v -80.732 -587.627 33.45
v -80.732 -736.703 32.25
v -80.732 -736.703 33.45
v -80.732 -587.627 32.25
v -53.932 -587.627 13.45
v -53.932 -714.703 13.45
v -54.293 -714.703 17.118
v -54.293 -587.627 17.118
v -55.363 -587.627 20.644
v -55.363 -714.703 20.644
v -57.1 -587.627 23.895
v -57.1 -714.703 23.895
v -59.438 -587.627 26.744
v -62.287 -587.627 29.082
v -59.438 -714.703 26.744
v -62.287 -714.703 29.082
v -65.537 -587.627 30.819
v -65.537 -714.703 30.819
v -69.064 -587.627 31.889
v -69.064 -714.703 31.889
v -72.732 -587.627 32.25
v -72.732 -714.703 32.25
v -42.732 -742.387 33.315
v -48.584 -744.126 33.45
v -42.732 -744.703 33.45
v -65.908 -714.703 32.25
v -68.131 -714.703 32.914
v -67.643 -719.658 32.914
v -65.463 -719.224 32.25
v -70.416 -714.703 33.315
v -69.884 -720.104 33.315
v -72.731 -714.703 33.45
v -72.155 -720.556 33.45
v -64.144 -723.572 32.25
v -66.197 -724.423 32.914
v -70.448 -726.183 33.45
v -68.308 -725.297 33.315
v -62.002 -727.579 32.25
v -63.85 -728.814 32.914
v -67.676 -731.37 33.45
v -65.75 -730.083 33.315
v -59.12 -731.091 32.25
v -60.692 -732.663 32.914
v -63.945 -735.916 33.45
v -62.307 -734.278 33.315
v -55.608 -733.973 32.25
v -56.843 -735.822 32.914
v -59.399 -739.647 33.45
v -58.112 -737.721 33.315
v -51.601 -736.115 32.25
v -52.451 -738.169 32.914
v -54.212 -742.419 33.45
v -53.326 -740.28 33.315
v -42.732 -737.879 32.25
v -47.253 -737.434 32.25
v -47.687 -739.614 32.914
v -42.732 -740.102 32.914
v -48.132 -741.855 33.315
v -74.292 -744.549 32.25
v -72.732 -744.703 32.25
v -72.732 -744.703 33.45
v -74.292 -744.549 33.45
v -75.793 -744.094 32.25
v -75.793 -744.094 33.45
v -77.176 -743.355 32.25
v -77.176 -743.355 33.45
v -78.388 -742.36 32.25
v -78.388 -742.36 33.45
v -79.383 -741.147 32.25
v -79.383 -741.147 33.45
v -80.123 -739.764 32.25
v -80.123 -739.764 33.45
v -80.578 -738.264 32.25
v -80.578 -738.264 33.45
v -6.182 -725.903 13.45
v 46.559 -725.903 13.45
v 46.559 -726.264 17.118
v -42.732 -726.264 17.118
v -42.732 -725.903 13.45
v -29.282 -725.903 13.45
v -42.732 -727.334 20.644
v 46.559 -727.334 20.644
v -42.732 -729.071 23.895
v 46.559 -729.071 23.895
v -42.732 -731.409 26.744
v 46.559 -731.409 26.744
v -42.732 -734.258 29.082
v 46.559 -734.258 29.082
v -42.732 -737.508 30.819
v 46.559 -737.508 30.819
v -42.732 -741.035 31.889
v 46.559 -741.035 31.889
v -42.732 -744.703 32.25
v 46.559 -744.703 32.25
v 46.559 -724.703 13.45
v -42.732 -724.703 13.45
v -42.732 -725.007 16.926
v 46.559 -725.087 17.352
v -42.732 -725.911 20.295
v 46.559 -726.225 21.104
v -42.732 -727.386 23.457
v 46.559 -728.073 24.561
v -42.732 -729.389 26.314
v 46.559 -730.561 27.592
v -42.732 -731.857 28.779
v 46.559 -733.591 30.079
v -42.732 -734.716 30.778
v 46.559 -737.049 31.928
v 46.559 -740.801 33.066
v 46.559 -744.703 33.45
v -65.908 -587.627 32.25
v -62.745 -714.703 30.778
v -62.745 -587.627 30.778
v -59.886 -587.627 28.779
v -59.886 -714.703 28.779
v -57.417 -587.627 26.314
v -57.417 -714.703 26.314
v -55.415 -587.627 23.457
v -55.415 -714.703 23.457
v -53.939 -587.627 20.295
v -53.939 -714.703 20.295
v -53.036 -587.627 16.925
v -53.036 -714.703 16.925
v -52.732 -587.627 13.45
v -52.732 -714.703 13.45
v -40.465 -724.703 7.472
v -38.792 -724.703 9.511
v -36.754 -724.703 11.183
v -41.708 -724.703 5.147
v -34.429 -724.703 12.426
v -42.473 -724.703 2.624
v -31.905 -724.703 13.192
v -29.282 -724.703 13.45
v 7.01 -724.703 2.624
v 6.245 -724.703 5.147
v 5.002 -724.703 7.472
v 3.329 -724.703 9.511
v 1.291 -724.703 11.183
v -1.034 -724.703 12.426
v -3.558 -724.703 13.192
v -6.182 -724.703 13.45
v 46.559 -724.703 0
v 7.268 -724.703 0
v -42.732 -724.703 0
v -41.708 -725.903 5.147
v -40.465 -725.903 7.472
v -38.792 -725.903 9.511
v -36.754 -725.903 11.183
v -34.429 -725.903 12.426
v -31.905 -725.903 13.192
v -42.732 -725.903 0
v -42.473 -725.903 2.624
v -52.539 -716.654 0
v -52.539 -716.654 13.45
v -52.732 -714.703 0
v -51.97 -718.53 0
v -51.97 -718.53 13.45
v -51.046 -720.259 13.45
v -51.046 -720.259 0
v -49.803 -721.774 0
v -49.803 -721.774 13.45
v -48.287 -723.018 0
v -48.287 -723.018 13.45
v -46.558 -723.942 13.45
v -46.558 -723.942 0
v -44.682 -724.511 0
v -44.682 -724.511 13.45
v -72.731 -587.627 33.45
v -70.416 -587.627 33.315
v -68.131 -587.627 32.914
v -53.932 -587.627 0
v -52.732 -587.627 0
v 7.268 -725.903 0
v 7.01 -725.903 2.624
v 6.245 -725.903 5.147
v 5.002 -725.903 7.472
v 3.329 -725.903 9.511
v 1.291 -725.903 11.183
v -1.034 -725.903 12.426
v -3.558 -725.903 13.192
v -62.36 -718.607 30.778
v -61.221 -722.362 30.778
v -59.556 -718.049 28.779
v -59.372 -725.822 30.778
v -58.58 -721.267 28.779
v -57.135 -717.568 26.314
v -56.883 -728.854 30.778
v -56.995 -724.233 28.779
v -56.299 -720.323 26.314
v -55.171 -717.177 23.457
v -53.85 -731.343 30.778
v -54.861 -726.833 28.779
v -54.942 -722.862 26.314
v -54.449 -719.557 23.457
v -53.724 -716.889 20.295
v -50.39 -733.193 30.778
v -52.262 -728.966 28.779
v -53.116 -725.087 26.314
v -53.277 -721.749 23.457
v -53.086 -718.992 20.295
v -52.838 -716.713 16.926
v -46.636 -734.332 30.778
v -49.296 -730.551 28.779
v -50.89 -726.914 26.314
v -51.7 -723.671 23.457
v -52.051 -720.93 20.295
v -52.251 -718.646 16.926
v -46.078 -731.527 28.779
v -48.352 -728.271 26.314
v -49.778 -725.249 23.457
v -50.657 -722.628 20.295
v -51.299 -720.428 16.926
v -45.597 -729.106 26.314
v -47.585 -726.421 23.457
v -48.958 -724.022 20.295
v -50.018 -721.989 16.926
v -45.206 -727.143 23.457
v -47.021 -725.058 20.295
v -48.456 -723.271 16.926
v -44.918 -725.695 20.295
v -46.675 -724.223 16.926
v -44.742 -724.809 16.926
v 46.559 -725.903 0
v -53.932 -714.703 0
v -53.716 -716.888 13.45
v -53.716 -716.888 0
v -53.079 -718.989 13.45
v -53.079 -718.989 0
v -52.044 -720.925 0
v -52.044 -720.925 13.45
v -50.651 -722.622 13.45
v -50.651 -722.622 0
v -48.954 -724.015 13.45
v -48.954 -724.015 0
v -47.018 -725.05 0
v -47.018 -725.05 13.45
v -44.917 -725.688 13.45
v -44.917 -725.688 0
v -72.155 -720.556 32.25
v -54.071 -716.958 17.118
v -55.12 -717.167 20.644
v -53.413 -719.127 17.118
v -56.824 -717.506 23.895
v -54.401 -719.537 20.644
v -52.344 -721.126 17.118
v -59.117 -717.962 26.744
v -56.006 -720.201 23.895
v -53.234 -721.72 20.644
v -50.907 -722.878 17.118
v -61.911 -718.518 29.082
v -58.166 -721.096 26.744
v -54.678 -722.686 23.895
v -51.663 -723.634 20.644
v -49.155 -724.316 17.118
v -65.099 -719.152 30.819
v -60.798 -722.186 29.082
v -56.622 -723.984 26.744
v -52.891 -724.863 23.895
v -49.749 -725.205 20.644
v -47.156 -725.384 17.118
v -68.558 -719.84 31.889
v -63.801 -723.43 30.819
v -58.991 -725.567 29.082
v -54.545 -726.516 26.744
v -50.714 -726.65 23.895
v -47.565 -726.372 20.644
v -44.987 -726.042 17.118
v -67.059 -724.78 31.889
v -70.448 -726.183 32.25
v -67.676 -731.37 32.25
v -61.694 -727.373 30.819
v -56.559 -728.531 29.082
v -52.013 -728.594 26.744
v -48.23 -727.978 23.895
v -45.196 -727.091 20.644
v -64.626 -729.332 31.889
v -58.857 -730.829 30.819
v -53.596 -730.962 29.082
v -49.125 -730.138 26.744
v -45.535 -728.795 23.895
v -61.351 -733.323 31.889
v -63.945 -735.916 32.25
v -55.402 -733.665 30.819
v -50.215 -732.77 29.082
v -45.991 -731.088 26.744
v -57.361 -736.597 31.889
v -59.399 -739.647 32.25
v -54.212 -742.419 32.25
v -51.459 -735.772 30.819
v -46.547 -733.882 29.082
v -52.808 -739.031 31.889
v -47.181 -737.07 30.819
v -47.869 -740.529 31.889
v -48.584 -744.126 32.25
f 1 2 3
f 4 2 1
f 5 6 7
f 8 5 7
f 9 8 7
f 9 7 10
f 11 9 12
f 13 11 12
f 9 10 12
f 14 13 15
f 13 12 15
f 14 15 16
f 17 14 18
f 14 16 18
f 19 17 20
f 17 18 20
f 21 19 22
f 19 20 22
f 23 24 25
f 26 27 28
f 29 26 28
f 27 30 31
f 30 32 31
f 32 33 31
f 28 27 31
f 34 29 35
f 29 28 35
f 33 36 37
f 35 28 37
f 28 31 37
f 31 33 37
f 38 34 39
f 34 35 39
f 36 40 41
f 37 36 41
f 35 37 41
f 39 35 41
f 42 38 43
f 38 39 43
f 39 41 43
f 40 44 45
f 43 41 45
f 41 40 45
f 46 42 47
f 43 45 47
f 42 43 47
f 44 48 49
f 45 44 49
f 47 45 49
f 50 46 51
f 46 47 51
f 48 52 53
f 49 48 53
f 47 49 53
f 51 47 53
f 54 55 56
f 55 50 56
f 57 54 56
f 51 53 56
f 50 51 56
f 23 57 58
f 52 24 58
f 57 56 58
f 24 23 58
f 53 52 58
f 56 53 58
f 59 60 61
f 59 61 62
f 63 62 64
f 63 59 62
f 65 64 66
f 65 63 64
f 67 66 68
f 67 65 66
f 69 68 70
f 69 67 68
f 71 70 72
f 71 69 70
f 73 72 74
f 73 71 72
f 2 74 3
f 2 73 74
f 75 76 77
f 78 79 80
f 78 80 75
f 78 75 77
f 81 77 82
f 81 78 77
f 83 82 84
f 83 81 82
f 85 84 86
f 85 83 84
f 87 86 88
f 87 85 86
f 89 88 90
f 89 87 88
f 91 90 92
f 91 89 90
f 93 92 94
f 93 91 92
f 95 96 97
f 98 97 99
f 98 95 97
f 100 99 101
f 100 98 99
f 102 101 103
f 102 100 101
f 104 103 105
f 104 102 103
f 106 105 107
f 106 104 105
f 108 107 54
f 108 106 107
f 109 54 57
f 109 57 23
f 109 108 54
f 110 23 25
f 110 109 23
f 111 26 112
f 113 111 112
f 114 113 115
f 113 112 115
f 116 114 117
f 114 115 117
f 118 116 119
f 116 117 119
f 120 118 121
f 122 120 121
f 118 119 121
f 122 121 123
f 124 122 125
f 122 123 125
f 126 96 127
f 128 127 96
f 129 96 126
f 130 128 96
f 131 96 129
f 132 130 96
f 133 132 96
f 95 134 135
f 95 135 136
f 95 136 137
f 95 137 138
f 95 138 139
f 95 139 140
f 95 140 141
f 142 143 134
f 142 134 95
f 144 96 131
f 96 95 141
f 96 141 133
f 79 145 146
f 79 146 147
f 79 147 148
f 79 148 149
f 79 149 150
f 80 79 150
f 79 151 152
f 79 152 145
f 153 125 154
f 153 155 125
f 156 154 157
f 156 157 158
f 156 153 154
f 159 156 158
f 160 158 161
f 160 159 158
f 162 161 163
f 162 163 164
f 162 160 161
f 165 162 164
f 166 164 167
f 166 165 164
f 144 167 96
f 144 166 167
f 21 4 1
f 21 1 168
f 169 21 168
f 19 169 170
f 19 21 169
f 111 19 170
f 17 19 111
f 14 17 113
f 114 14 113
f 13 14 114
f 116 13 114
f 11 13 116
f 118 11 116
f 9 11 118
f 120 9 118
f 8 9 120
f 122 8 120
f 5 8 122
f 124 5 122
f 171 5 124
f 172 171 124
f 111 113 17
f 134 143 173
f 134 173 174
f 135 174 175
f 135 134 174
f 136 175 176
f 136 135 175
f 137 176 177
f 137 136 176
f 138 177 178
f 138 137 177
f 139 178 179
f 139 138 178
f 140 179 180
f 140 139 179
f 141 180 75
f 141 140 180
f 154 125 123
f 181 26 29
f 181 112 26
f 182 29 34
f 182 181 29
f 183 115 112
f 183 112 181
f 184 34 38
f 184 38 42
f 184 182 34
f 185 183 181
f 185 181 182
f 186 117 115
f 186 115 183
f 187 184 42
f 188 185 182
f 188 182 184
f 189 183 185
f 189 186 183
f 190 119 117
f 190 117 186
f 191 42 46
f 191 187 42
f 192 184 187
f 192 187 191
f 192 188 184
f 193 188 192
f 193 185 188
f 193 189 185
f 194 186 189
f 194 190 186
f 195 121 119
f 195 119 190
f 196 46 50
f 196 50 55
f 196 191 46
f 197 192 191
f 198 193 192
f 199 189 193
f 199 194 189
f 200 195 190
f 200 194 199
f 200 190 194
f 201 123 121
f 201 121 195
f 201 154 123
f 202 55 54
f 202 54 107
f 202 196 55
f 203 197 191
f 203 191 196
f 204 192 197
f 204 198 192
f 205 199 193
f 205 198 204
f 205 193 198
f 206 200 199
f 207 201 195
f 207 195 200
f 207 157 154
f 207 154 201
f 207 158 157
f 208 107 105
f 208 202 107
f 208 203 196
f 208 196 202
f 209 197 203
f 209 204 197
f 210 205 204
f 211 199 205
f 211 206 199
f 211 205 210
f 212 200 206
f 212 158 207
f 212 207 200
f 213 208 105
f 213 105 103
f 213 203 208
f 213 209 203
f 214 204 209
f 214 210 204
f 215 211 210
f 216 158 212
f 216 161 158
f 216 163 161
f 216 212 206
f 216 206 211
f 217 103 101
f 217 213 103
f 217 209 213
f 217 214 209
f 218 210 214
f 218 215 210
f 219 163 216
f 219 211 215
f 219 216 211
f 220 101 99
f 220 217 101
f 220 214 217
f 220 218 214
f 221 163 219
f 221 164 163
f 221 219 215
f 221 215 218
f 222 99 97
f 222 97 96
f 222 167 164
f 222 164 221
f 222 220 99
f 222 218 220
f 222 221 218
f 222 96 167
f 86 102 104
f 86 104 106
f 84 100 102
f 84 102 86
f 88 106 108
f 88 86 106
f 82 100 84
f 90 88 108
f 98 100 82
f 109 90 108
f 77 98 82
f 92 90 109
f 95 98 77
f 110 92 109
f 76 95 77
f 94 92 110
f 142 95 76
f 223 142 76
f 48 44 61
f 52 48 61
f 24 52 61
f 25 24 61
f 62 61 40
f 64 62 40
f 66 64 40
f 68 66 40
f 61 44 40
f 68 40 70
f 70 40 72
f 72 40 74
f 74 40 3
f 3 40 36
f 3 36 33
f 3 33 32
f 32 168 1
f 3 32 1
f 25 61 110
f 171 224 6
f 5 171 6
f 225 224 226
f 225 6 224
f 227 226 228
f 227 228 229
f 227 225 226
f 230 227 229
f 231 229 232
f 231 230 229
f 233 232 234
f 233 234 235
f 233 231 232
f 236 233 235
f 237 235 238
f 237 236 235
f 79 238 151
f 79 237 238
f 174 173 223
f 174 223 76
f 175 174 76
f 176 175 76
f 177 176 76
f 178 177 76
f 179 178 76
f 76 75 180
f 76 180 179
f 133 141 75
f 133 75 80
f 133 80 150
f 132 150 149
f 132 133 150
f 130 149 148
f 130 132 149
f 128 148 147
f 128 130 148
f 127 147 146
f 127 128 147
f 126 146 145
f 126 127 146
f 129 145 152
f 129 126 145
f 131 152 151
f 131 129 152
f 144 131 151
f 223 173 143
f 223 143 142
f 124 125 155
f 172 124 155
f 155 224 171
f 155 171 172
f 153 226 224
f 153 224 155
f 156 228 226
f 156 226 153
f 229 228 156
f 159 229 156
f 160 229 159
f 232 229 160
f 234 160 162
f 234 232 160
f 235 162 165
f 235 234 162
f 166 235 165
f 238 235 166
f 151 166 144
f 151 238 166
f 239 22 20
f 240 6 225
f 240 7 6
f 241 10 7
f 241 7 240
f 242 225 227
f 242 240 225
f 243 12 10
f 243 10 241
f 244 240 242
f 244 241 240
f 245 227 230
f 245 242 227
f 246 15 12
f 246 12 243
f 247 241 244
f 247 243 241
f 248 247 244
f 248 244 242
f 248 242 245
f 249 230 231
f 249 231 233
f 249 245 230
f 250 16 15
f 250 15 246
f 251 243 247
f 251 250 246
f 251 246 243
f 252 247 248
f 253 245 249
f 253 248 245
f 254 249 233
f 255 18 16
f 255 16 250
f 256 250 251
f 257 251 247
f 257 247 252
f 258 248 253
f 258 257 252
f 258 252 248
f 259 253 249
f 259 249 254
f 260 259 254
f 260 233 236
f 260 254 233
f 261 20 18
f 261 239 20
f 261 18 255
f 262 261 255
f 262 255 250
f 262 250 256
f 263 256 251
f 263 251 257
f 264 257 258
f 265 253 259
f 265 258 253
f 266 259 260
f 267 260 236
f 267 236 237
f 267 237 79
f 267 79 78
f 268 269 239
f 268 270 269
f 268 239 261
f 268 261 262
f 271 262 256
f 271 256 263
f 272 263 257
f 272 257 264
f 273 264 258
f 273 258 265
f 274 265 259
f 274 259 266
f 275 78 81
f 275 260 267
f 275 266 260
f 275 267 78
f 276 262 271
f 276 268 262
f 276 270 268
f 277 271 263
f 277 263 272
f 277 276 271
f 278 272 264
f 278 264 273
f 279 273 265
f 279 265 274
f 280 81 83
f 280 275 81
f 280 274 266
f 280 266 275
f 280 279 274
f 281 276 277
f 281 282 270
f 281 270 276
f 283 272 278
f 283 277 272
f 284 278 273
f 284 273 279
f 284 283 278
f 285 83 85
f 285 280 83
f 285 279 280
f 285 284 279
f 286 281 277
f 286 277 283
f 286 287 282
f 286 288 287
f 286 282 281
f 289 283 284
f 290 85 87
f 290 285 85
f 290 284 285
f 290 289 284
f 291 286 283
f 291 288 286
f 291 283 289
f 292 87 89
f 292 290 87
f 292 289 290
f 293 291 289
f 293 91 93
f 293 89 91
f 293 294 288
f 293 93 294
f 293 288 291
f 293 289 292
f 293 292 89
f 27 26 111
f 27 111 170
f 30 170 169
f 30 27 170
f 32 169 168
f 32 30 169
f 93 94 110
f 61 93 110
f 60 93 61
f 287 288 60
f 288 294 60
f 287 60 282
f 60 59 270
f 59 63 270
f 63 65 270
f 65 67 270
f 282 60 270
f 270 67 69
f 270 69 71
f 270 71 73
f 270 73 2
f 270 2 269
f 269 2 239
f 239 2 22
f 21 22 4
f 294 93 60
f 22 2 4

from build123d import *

# Parameters (mm, degrees)
BOSS_EXTRUDE1_DEPTH = 33.45
FILLET1_R           = 10
FILLET2_R           = 20
SHELL1_START        = -80.731515082
SHELL1_OUTLINE_W    = 157.075623287
SHELL1_OUTLINE_H    = 32.25
SHELL1_DEPTH        = 38
SHELL1_START_2      = -52.731515082
SHELL1_2_DEPTH      = 99.290578512
SHELL1_START_3      = -714.702863061
SHELL1_3_DEPTH      = 127.075623287
SHELL1_4_ANGLE      = 90
CUT_EXTRUDE1_REACH  = 164.561


with BuildPart() as part:
    # Sketch1 → Boss-Extrude1 (new body)
    with BuildSketch(Plane.XY):
        with BuildLine():
            Line((46.55906343, -744.702863061), (-72.731515082, -744.702863061))
            ThreePointArc((-72.731515082, -744.702863061), (-78.388369332, -742.359717311), (-80.731515082, -736.702863061))
            Line((-80.731515082, -736.702863061), (-80.731515082, -587.627239774))
            Line((-80.731515082, -587.627239774), (-52.731515082, -587.627239774))
            Line((-52.731515082, -587.627239774), (-52.731515082, -724.702863061))
            Line((-52.731515082, -724.702863061), (46.55906343, -724.702863061))
            Line((46.55906343, -724.702863061), (46.55906343, -744.702863061))
        make_face()
    extrude(amount=BOSS_EXTRUDE1_DEPTH)

    # Fillet1
    fillet1_edges = [part.edges().sort_by_distance(p)[0] for p in [
        (-52.731515082, -724.702863061, 16.725),
    ]]
    fillet(fillet1_edges, radius=FILLET1_R)

    # Fillet2
    fillet2_edges = [part.edges().sort_by_distance(p)[0] for p in [
        (-52.731515082, -651.165051418, 33.45),
        (-49.802582894, -721.773930873, 33.45),
        (1.913774174, -724.702863061, 33.45),
    ]]
    fillet(fillet2_edges, radius=FILLET2_R - 0.0001)  # a hair under: the kernel refuses the full size

    # Shell1: read off the stored shape, not the designer's step
    # Shell1 outline → Shell1 (cut)
    with BuildSketch(Plane.YZ.offset(SHELL1_START)):
        with Locations((-666.165051418, 16.125)):
            Rectangle(SHELL1_OUTLINE_W, SHELL1_OUTLINE_H)
    extrude(amount=SHELL1_DEPTH, mode=Mode.SUBTRACT)

    # Shell1 2 outline → Shell1 2 (cut)
    with BuildSketch(Plane.YZ.offset(SHELL1_START_2)):
        with BuildLine():
            Line((-725.902863061, 0), (-725.902863061, 13.45))
            ThreePointArc((-725.902863061, 13.45), (-731.409255575, 26.743607486), (-744.702863061, 32.25))
            Line((-744.702863061, 32.25), (-744.702863061, 0))
            Line((-744.702863061, 0), (-725.902863061, 0))
        make_face()
    extrude(amount=SHELL1_2_DEPTH, mode=Mode.SUBTRACT)

    # Shell1 3 outline → Shell1 3 (add)
    with BuildSketch(Plane(origin=(0, 0, 0), x_dir=(1, 0, 0), z_dir=(0, 1, 0)).offset(SHELL1_START_3)):
        with BuildLine():
            Line((-52.731515082, -13.45), (-52.731515082, 0))
            Line((-52.731515082, 0), (-53.931515082, 0))
            Line((-53.931515082, 0), (-53.931515082, -13.45))
            ThreePointArc((-53.931515082, -13.45), (-59.437907596, -26.743607486), (-72.731515082, -32.25))
            Line((-72.731515082, -32.25), (-65.908026238, -32.25))
            ThreePointArc((-65.908026238, -32.25), (-56.353637062, -24.928898534), (-52.731515082, -13.45))
        make_face()
    extrude(amount=SHELL1_3_DEPTH)

    # Shell1 4 outline → Shell1 4 (revolve)
    with BuildSketch(Plane(origin=(-42.731515082, -714.702863061, 0), x_dir=(-1, 0, 0), z_dir=(0, 1, 0))):
        with BuildLine():
            Line((10, 13.45), (10, 0))
            Line((10, 0), (11.2, 0))
            Line((11.2, 0), (11.2, 13.45))
            ThreePointArc((11.2, 13.45), (16.706392514, 26.743607486), (30, 32.25))
            Line((30, 32.25), (23.176511156, 32.25))
            ThreePointArc((23.176511156, 32.25), (13.62212198, 24.928898534), (10, 13.45))
        make_face()
    revolve(axis=Axis((-42.731515082, -714.702863061, 0), (0, 0, 1)), revolution_arc=SHELL1_4_ANGLE)

    # Cut-Extrude1: up to this face of the body (flat: up to its plane)
    cut_extrude1_end = Plane(part.part.faces().sort_by_distance((1.913774174, -725.902863061, 6.725))[0])
    # Sketch3 → Cut-Extrude1 (cut, up to the picked face)
    with BuildSketch(Plane(origin=(0, -724.702863061, 0), x_dir=(1, 0, 0), z_dir=(0, 1, 0)), mode=Mode.PRIVATE) as cut_extrude1_sk1:
        with BuildLine():
            Line((-29.281515082, 13.45), (-6.181515082, 13.45))
            ThreePointArc((-6.181515082, 13.45), (7.268484918, 0), (-6.181515082, -13.45))
            Line((-6.181515082, -13.45), (-29.281515082, -13.45))
            ThreePointArc((-29.281515082, -13.45), (-42.731515082, 0), (-29.281515082, 13.45))
        make_face()
    cut_extrude1_tool1 = split(extrude(cut_extrude1_sk1.sketch, amount=-CUT_EXTRUDE1_REACH, mode=Mode.PRIVATE), bisect_by=cut_extrude1_end, keep=Keep.BOTH, mode=Mode.PRIVATE)
    add(cut_extrude1_tool1.solids().sort_by(Axis((-17.731515, -724.702863, 0), (0, -1, 0)))[0], mode=Mode.SUBTRACT)


solid = part.part
